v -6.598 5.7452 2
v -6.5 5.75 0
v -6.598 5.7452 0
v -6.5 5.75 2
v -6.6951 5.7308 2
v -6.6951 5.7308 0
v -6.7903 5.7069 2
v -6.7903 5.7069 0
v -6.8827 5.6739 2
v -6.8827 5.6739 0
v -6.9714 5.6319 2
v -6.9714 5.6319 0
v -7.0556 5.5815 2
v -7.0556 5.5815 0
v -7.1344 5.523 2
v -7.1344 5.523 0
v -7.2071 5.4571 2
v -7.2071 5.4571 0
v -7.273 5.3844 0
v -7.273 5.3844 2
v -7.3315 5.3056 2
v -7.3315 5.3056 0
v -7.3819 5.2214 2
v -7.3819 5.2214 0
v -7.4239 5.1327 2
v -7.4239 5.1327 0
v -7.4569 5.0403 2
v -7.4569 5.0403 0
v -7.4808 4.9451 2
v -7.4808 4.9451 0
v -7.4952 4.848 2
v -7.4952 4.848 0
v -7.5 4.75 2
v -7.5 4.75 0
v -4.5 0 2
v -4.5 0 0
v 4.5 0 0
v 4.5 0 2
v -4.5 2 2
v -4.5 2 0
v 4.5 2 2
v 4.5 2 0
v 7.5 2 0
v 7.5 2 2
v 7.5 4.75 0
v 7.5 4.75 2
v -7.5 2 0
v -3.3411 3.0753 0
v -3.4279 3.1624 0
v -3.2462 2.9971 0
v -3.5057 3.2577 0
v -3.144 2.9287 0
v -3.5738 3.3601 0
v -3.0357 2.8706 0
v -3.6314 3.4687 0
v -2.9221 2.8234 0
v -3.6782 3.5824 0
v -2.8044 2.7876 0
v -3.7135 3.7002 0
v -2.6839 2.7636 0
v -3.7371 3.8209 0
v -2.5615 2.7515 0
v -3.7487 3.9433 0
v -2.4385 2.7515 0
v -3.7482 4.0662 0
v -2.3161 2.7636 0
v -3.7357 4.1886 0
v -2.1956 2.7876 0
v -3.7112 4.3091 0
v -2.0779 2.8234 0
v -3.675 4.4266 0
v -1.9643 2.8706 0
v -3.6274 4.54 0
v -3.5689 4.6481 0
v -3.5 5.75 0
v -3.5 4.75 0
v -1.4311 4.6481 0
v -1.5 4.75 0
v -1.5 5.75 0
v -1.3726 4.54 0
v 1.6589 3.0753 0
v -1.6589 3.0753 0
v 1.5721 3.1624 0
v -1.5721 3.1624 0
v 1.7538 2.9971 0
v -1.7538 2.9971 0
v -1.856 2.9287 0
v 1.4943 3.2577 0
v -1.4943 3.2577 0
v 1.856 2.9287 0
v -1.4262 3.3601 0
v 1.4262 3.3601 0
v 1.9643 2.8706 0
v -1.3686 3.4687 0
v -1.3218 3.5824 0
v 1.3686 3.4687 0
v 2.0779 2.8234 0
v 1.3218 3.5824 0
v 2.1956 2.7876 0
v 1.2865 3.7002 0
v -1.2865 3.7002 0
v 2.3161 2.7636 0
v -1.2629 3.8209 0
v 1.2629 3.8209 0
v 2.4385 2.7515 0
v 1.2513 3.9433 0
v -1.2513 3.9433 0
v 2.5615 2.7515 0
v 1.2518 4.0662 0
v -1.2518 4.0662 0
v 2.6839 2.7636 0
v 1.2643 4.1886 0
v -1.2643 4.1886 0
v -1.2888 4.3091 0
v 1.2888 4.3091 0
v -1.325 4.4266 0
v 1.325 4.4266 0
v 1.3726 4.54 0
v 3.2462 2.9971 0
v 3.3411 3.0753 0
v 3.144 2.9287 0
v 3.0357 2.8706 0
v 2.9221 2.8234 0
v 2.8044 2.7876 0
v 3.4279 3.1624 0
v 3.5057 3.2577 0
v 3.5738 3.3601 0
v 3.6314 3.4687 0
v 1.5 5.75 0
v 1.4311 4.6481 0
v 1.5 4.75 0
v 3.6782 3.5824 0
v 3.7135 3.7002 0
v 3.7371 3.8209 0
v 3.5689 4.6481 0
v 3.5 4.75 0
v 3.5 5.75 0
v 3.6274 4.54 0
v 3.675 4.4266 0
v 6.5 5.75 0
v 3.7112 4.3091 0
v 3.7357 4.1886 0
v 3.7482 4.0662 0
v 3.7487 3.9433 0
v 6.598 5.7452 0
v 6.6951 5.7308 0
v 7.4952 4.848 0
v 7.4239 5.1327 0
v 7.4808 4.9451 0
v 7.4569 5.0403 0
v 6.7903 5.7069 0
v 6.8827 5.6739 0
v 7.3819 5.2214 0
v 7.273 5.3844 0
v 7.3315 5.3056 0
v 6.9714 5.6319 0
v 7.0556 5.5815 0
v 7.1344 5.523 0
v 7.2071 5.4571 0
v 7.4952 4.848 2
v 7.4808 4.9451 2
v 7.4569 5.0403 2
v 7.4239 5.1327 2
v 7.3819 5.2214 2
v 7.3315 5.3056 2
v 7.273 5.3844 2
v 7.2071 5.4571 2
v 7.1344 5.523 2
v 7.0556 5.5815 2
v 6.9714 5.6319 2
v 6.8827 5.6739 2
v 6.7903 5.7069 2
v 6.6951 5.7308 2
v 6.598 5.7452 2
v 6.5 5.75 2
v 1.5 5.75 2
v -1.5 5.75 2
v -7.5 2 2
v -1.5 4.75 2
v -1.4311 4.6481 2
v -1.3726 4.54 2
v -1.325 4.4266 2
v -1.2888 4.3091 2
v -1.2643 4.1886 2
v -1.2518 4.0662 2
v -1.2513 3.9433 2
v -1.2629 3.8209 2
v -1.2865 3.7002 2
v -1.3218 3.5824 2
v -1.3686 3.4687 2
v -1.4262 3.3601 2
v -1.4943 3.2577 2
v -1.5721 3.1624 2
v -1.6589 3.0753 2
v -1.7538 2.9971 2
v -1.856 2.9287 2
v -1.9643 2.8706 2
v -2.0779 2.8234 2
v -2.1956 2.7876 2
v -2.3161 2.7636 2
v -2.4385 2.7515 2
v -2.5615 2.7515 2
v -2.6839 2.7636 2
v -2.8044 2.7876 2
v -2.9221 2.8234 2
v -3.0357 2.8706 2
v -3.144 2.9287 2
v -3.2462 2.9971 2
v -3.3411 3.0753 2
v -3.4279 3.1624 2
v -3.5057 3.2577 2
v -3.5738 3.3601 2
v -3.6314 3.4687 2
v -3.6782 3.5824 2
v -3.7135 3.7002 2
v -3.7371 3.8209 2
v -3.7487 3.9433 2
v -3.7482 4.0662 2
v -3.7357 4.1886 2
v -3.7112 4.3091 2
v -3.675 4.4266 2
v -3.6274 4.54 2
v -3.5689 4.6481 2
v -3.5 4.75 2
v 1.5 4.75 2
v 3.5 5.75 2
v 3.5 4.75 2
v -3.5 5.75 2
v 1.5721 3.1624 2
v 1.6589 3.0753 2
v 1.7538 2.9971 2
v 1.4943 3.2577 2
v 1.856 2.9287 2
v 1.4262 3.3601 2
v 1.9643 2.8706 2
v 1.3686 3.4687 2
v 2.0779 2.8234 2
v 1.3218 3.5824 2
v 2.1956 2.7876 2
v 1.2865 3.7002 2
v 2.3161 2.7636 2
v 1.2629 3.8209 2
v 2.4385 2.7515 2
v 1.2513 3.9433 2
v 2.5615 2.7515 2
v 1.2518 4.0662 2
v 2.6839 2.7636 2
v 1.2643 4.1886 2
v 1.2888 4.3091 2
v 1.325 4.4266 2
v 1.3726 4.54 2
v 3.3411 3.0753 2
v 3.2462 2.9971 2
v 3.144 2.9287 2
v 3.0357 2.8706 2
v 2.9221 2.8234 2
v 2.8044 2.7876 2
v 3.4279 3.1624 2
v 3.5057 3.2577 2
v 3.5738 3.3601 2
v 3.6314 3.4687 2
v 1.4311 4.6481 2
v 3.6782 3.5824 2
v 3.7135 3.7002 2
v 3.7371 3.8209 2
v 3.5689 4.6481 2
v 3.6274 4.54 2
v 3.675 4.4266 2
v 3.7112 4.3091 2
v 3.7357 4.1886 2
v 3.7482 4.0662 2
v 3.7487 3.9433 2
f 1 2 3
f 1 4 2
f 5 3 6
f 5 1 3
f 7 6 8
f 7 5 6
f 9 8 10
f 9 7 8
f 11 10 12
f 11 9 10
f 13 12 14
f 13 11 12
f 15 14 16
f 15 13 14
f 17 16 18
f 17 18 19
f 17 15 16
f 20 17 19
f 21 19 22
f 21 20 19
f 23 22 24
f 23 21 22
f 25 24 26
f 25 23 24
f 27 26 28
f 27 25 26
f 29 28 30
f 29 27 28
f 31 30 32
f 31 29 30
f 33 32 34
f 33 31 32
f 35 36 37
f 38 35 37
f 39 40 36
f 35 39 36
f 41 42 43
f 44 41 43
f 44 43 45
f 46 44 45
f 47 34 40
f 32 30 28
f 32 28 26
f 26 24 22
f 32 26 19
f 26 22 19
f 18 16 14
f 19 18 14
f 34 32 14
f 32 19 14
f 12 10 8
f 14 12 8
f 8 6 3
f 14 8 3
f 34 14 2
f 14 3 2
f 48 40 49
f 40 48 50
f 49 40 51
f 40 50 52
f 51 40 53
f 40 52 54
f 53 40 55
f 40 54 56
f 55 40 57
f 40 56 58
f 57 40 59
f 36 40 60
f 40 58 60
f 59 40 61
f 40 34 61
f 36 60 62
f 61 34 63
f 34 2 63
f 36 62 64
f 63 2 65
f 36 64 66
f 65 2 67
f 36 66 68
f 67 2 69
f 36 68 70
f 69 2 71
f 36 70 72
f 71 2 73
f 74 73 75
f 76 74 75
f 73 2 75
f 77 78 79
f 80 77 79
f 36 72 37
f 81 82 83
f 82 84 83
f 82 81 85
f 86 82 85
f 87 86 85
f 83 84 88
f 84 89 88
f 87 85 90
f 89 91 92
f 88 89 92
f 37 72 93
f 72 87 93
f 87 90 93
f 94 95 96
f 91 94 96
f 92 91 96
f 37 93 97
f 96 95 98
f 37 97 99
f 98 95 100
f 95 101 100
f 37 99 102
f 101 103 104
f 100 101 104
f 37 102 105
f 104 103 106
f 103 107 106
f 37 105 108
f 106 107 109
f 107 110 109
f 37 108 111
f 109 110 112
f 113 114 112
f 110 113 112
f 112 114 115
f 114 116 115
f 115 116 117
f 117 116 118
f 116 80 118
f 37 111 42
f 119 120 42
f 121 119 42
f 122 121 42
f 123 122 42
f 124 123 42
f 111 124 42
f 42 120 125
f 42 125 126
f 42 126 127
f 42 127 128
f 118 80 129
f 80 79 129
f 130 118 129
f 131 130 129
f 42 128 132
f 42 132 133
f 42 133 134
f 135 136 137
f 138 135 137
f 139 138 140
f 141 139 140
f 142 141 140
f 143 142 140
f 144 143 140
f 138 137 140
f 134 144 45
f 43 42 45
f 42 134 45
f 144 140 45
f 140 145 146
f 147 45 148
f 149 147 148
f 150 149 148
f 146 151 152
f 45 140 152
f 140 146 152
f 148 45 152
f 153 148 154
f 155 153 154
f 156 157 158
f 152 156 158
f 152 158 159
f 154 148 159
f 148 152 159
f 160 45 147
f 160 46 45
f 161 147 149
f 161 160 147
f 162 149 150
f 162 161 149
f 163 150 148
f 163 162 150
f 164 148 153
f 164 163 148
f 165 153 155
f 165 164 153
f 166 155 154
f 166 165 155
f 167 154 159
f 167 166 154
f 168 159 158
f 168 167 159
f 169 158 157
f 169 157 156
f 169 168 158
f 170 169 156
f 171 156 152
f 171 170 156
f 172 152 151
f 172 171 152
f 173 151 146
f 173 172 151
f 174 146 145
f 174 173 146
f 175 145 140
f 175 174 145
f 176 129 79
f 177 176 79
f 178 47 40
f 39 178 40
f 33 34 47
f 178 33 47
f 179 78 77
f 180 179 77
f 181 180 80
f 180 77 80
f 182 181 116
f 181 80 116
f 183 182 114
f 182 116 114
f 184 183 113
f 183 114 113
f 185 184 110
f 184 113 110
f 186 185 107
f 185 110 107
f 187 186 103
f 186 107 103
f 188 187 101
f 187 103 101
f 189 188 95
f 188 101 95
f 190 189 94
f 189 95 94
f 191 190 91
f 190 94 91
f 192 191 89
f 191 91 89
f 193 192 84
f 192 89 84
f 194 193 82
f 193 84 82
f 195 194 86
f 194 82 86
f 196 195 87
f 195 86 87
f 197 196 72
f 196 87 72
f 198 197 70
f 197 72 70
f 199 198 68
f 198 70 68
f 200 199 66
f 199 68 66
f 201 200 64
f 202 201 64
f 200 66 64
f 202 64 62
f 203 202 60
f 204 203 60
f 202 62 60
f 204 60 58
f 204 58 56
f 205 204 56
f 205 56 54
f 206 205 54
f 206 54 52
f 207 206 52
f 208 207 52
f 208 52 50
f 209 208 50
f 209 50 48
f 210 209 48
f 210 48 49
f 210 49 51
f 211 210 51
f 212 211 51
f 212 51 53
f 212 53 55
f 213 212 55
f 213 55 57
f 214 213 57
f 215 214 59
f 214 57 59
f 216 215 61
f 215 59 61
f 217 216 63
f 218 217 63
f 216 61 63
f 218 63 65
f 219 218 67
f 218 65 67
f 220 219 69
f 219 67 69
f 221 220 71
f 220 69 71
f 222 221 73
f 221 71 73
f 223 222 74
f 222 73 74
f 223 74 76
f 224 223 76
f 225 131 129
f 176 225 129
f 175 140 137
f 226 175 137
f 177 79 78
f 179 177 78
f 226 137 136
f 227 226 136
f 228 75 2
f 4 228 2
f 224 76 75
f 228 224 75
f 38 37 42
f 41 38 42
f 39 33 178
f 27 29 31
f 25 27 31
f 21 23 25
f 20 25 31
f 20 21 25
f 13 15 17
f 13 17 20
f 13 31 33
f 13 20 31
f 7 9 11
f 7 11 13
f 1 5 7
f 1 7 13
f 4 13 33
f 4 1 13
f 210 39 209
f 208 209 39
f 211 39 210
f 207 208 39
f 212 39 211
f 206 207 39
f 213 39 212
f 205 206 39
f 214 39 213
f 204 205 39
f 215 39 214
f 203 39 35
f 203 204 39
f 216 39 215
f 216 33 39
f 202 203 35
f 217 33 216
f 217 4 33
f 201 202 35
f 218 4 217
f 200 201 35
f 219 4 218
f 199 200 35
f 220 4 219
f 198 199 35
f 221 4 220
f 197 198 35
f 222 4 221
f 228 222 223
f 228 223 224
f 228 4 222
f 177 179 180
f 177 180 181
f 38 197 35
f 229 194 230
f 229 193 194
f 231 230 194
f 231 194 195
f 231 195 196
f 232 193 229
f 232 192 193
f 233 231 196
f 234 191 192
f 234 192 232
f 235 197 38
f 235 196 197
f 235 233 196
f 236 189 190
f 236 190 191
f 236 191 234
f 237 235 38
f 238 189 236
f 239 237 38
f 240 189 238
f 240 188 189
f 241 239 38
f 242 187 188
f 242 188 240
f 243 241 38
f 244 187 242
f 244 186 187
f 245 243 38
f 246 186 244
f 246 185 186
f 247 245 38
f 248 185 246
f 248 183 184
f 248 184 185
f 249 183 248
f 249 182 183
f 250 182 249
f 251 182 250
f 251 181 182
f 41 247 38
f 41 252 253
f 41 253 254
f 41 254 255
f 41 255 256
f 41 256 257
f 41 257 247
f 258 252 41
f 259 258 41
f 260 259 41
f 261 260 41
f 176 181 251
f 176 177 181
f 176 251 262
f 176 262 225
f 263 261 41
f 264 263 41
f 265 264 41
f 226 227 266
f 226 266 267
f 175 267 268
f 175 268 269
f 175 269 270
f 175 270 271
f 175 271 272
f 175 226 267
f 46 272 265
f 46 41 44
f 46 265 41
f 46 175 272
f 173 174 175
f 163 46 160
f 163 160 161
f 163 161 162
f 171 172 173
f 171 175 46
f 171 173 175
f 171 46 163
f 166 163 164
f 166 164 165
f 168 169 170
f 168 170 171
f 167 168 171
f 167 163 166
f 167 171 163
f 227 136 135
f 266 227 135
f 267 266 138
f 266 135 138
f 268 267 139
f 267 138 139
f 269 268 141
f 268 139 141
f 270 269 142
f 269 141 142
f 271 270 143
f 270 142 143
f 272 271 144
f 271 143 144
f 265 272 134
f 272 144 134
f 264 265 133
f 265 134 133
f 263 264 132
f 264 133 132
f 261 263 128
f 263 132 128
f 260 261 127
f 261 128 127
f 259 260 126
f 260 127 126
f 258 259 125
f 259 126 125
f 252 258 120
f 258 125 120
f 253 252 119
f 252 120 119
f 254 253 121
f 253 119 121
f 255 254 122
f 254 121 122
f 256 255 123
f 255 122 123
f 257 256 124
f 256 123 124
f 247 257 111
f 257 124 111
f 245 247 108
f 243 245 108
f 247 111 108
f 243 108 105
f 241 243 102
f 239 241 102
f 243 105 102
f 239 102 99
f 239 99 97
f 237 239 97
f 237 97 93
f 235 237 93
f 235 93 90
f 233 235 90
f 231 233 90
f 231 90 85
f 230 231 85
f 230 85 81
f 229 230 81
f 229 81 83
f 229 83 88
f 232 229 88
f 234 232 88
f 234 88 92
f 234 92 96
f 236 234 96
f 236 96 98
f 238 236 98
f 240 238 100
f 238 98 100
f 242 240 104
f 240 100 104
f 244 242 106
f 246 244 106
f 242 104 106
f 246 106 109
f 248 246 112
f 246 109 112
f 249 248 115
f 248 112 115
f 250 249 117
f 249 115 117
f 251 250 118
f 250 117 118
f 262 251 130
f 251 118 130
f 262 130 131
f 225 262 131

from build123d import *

# Parameters (mm, degrees)
TUBE_PLATE_MCP_BODY_DEPTH   = 2
TUBE_PLATE_MCP_CONTOURING_R = 1


with BuildPart() as part:
    # Sketch1 → Tube Plate MCP Body (new body)
    with BuildSketch(Plane.XY):
        with BuildLine():
            Line((-4.5, 0), (4.5, 0))
            Line((4.5, 0), (4.5, 2))
            Line((4.5, 2), (7.5, 2))
            Line((7.5, 2), (7.5, 5.75))
            Line((7.5, 5.75), (3.5, 5.75))
            Line((3.5, 5.75), (3.5, 4.75))
            ThreePointArc((3.5, 4.75), (2.5, 2.75), (1.5, 4.75))
            Line((1.5, 4.75), (1.5, 5.75))
            Line((1.5, 5.75), (-1.5, 5.75))
            Line((-1.5, 5.75), (-1.5, 4.75))
            ThreePointArc((-1.5, 4.75), (-2.5, 2.75), (-3.5, 4.75))
            Line((-3.5, 4.75), (-3.5, 5.75))
            Line((-3.5, 5.75), (-7.5, 5.75))
            Line((-7.5, 5.75), (-7.5, 2))
            Line((-7.5, 2), (-4.5, 2))
            Line((-4.5, 2), (-4.5, 0))
        make_face()
    extrude(amount=TUBE_PLATE_MCP_BODY_DEPTH)

    # Tube Plate MCP Contouring
    tube_plate_mcp_contouring_edges = [part.edges().sort_by_distance(p)[0] for p in [
        (-7.5, 5.75, 1),
        (7.5, 5.75, 1),
    ]]
    fillet(tube_plate_mcp_contouring_edges, radius=TUBE_PLATE_MCP_CONTOURING_R)


solid = part.part
